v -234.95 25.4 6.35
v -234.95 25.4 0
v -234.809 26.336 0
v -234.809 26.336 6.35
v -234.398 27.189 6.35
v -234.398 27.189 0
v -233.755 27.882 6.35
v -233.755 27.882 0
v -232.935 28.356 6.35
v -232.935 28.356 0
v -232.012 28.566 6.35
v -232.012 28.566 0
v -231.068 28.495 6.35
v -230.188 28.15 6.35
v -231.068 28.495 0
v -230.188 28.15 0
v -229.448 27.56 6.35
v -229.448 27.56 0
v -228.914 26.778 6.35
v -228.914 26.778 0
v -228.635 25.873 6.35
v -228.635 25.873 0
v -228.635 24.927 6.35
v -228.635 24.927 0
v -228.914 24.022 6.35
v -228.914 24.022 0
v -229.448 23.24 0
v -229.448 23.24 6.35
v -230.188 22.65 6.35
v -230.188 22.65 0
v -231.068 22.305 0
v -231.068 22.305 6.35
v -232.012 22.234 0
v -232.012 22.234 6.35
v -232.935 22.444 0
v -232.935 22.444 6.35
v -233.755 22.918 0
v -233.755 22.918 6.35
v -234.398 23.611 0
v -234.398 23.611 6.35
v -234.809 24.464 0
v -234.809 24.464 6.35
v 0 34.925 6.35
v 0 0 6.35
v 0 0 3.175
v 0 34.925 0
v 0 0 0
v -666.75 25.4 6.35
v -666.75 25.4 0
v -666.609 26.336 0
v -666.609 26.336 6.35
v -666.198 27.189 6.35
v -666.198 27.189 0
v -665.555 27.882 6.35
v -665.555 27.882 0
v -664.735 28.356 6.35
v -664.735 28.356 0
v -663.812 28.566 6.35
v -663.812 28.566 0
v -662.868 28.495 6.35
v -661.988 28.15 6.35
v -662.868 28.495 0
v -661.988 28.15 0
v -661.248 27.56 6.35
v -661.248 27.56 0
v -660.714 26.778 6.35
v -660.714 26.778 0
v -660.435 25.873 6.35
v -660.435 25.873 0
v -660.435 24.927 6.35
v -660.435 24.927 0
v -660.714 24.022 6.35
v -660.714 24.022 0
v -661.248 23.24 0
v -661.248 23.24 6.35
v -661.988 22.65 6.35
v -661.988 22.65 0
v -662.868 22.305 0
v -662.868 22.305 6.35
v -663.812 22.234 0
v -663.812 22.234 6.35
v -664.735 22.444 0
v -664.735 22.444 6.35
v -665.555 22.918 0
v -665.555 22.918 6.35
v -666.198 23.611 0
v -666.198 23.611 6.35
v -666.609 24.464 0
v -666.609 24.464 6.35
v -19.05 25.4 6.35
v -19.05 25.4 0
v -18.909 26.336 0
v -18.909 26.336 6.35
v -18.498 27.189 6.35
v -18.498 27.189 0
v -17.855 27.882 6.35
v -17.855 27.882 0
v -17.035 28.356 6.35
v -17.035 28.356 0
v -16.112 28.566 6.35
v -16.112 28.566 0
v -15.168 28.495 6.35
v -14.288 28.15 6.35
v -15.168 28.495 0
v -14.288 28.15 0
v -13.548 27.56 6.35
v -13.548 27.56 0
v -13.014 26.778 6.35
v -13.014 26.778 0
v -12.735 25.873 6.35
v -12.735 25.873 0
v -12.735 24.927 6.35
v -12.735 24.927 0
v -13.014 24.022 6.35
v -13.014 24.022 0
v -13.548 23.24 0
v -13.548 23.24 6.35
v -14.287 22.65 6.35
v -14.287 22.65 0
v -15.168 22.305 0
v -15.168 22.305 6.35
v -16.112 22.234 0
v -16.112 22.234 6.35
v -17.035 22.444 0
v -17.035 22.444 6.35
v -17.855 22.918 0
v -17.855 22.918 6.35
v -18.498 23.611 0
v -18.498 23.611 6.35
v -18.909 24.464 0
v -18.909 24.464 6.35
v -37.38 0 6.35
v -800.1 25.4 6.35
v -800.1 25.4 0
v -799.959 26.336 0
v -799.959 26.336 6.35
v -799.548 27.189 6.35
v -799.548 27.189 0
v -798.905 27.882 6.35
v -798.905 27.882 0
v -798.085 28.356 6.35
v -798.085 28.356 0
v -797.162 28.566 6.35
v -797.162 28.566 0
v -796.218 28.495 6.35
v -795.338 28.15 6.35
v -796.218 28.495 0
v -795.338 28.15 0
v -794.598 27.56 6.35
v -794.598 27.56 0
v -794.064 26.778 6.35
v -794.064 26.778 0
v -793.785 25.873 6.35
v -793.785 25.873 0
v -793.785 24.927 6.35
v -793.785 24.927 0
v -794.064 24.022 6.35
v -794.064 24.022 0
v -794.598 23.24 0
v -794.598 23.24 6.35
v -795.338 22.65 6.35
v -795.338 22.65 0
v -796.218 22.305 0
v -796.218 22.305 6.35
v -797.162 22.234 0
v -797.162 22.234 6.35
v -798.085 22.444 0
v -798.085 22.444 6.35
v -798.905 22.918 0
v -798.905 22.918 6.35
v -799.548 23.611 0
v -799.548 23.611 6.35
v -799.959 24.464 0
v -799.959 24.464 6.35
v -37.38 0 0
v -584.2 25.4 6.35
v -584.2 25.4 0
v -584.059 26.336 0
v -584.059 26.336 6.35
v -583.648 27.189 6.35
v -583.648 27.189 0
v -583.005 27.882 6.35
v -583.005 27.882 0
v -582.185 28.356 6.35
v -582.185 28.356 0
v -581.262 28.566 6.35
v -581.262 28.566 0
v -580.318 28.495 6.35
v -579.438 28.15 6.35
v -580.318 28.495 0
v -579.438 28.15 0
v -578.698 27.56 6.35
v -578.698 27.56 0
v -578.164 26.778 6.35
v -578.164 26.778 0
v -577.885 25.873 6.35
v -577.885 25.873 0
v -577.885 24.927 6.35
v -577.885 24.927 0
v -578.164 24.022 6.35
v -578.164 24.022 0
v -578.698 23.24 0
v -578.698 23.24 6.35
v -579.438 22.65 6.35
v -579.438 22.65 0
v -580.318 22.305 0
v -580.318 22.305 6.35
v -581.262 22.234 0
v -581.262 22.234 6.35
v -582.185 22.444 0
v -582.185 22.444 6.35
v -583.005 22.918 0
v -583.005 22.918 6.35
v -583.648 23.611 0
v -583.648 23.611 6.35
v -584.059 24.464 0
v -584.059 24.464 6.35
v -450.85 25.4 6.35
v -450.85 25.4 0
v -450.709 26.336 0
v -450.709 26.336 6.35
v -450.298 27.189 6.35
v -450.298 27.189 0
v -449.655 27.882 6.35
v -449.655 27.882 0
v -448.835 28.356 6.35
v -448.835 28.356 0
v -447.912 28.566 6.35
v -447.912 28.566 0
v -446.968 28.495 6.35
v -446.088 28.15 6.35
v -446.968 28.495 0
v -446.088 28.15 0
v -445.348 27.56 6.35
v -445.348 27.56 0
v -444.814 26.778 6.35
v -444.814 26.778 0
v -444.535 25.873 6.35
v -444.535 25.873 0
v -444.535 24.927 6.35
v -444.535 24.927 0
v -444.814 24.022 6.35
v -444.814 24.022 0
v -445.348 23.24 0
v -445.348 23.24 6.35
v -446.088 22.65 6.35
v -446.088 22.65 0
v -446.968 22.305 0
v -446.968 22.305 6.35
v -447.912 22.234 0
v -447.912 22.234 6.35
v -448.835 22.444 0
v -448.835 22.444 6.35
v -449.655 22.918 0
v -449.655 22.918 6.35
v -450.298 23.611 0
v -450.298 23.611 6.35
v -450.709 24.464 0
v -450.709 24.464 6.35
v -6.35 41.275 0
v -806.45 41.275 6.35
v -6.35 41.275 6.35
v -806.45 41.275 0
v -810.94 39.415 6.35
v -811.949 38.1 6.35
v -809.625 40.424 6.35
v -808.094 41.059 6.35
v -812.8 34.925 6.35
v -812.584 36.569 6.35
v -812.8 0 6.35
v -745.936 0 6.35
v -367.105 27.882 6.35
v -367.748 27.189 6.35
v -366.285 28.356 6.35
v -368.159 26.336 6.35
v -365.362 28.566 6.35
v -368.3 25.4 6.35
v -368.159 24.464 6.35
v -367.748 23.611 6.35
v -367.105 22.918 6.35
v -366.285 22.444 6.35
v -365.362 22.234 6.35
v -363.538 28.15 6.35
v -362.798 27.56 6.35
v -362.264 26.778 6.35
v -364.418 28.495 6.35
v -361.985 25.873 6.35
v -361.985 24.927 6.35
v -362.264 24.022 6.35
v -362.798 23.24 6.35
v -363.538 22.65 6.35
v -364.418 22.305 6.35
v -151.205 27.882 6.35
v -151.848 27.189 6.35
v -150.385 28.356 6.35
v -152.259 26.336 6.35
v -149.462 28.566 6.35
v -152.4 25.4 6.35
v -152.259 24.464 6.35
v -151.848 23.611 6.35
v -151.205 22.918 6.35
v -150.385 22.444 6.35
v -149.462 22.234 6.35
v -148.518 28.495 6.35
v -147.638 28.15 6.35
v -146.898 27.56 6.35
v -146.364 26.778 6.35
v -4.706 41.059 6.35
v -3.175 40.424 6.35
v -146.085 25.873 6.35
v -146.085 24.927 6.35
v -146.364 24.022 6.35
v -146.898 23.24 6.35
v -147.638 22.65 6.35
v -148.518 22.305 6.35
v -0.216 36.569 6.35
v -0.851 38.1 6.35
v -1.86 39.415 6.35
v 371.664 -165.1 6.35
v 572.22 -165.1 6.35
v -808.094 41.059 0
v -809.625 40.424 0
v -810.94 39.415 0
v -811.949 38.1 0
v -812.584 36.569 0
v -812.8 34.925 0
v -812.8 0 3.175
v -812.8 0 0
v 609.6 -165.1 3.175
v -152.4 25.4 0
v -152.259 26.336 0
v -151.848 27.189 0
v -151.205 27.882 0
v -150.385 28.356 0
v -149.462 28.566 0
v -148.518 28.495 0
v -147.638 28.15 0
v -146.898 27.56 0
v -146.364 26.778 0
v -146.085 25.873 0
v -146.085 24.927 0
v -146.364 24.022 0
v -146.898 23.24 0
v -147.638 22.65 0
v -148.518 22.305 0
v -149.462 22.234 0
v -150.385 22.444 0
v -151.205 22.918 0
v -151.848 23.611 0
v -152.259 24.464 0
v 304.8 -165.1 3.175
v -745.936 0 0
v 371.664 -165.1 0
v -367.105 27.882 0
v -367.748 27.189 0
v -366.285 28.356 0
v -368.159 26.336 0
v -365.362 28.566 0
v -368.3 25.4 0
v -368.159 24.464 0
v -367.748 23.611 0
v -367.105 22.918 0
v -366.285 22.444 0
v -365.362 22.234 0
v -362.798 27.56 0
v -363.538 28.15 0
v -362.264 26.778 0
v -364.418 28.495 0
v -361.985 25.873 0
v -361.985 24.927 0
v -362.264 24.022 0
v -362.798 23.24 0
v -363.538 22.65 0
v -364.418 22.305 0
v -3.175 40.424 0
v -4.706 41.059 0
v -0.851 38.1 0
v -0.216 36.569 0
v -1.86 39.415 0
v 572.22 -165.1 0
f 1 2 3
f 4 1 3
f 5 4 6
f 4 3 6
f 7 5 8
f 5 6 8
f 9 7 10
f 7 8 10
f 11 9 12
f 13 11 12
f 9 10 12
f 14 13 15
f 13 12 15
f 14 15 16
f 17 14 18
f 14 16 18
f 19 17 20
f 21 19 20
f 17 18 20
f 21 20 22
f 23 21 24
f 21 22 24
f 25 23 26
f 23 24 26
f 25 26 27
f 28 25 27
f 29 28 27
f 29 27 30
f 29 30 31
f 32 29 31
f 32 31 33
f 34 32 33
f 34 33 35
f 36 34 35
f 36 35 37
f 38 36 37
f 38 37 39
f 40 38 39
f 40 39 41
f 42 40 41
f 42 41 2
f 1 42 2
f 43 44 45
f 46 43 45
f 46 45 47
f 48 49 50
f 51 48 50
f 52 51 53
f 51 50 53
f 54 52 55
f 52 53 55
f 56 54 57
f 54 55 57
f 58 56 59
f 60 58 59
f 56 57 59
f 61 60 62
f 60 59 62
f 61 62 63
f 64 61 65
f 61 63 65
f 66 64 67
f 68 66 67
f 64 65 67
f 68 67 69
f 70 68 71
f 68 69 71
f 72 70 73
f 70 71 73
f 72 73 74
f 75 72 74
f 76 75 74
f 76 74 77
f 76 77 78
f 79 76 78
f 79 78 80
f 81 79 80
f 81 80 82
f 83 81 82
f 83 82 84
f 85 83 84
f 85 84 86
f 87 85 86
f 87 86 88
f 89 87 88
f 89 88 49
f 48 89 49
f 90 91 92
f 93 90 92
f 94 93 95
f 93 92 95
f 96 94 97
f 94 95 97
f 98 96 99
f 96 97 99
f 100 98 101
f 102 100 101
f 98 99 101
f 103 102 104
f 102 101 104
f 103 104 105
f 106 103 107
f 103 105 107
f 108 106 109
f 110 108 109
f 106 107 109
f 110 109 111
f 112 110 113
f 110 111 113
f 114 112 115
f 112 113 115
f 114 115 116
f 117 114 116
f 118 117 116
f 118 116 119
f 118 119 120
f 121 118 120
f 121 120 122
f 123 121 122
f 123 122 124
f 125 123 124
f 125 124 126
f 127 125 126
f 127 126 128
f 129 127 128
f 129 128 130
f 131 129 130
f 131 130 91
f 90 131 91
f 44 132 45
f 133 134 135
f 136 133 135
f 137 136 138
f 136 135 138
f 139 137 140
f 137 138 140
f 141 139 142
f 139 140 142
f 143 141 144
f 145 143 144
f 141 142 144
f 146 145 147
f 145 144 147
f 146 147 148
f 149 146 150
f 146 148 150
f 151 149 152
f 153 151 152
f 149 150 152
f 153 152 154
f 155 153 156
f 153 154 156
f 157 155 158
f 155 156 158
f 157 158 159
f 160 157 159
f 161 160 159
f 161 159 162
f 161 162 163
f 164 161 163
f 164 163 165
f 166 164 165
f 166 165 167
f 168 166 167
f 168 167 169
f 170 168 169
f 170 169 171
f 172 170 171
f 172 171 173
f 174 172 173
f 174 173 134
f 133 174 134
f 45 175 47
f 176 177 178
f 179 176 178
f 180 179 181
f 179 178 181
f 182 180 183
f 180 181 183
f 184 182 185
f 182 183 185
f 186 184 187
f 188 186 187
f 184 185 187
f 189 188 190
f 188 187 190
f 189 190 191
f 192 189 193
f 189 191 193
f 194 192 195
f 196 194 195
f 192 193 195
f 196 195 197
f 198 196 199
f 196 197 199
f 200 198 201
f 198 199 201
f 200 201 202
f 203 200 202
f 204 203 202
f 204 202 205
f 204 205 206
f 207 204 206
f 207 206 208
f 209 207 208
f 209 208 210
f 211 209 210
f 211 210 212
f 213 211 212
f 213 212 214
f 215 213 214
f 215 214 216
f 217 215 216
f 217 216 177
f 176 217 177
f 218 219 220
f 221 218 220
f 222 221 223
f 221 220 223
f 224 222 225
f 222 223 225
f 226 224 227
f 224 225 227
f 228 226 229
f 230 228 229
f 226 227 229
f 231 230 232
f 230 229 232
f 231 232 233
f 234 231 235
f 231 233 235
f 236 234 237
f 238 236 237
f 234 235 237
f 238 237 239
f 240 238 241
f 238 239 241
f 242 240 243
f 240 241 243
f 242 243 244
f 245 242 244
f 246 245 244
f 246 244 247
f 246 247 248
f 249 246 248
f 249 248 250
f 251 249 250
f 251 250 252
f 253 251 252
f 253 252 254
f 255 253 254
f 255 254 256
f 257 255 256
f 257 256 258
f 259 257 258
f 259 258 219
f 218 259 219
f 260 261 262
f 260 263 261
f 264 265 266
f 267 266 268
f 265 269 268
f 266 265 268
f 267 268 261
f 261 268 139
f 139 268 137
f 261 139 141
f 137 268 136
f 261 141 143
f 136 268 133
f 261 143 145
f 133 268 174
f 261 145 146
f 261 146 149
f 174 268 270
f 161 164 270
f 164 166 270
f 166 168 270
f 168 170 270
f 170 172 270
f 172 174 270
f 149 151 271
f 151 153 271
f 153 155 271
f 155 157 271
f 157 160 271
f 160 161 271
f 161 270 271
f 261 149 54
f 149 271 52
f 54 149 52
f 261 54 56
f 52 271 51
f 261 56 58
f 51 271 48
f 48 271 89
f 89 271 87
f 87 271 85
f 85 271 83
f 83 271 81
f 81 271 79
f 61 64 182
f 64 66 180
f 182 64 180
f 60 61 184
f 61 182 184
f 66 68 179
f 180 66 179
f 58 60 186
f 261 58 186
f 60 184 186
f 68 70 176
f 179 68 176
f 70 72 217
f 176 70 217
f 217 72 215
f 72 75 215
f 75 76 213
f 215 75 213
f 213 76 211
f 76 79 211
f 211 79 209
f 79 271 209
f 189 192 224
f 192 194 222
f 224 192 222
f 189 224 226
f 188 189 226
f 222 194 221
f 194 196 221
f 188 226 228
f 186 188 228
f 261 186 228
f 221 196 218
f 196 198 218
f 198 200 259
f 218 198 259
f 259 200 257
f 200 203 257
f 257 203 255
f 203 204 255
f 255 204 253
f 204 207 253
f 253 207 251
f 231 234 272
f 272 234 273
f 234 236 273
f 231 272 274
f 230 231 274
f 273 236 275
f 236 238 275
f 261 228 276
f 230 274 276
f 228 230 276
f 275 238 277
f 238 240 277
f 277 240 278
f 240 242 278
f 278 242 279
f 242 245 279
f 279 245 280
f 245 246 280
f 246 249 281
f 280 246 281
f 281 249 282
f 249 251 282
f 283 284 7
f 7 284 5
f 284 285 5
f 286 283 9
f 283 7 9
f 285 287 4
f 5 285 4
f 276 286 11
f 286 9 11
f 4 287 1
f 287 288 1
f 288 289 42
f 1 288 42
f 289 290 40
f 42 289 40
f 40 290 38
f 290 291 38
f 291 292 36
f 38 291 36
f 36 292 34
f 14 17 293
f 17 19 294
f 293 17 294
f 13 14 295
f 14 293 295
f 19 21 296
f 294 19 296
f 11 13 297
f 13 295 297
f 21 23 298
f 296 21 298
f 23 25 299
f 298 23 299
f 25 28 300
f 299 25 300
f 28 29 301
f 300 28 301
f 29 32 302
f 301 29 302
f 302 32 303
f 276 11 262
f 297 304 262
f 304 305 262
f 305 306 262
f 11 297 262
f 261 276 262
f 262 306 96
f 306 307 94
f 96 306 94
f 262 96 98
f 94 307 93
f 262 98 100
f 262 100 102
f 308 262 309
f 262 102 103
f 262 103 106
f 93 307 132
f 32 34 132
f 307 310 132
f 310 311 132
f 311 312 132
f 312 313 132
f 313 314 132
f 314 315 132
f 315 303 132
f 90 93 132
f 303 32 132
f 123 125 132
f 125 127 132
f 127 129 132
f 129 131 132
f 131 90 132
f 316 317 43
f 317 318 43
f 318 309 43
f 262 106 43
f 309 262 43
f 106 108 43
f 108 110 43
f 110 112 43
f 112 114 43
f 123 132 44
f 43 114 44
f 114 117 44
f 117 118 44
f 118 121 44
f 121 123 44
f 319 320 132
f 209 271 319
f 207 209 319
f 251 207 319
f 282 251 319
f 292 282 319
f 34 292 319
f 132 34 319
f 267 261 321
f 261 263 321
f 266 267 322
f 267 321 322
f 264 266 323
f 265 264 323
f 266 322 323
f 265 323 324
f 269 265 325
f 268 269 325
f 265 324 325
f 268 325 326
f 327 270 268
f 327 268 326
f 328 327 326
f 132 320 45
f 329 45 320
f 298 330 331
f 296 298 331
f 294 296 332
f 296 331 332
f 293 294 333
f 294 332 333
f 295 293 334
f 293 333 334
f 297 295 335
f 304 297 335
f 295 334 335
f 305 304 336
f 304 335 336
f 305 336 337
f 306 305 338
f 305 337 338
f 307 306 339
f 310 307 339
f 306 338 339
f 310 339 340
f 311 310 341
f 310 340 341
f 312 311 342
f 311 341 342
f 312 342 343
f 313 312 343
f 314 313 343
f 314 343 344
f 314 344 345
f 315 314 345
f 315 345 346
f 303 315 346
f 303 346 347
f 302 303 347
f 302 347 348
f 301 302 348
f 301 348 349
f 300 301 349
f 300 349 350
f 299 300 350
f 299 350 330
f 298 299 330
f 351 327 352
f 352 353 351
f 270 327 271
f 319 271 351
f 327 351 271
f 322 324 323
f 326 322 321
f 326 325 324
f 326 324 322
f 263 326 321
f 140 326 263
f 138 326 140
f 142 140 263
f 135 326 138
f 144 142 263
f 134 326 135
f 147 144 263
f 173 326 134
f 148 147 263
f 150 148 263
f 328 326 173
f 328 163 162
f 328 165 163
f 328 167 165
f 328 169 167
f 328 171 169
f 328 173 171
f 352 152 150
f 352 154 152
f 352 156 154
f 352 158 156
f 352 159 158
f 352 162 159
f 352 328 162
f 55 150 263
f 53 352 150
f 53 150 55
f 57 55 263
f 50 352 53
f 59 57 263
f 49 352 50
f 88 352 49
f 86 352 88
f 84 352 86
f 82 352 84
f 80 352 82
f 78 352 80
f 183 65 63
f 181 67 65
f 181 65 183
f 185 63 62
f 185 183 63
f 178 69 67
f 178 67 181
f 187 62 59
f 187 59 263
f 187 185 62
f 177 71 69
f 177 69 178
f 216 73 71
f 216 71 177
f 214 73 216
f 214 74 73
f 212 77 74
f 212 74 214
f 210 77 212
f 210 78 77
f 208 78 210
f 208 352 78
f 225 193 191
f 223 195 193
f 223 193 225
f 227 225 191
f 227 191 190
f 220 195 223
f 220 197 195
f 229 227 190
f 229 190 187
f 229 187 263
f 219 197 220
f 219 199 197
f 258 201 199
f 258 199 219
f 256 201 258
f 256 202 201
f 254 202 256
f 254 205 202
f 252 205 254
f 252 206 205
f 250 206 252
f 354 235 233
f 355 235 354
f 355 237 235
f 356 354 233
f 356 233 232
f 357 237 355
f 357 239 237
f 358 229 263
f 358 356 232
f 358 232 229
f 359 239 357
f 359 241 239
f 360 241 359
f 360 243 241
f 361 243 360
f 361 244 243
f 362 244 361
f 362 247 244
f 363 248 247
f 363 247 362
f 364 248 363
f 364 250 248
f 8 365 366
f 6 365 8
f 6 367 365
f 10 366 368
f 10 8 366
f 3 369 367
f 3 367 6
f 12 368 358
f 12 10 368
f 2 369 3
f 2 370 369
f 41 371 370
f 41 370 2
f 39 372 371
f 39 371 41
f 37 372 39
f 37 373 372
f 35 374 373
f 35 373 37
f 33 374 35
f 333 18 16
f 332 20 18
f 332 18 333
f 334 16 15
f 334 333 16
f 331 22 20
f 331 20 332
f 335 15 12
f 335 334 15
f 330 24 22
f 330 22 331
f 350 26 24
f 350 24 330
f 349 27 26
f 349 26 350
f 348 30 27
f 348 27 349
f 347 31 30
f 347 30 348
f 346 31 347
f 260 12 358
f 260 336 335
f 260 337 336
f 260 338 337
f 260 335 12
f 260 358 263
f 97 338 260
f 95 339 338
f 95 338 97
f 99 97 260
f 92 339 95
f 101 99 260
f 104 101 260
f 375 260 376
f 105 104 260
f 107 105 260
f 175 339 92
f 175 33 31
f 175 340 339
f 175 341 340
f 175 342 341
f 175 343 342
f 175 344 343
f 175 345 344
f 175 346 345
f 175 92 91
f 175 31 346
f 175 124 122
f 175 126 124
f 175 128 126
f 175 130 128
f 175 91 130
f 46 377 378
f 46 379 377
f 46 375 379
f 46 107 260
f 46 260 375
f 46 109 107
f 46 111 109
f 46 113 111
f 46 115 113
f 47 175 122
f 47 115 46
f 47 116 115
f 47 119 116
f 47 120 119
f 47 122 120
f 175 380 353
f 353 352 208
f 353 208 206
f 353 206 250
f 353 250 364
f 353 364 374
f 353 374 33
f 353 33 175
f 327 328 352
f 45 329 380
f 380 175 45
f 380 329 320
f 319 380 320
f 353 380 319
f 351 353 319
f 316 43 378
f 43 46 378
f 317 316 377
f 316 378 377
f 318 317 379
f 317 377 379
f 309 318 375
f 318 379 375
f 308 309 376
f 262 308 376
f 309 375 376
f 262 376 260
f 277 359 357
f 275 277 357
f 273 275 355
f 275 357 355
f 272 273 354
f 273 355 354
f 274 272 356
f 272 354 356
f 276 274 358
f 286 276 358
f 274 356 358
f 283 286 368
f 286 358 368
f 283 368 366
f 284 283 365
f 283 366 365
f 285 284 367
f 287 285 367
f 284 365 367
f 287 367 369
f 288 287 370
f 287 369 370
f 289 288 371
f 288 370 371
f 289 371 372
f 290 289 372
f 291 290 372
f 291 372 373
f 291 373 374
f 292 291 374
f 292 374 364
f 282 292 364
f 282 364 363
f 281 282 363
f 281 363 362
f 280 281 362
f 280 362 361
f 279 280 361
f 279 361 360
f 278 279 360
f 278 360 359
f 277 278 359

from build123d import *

# Parameters (mm, degrees)
BOSS_EXTRUDE1_DEPTH = 6.35
CUT_EXTRUDE5_DEPTH  = 1432.25665609
CUT_EXTRUDE6_DEPTH  = 721.614
SKETCH19_W          = 812.8
SKETCH19_H          = 6.35
BOSS_EXTRUDE8_DEPTH = 3.175
SKETCH20_W          = 812.8
SKETCH20_H          = 6.35
BOSS_EXTRUDE9_DEPTH = 38.1
FILLET1_R           = 6.35
FILLET2_R           = 6.35
CUT_EXTRUDE7_REACH  = 8.35
SKETCH22_R          = 3.175


with BuildPart() as part:
    # Sketch1 → Boss-Extrude1 (new body)
    with BuildSketch(Plane.XY):
        Polygon((-812.8, 0), (0, 0), (609.6, -165.1), (304.8, -165.1), align=None)
    extrude(amount=BOSS_EXTRUDE1_DEPTH)

    # Sketch17 → Cut-Extrude5 (cut, through all)
    with BuildSketch(Plane(origin=(-795.440818906, 117.508302793, 0), x_dir=(0, 0, -1), z_dir=(-0.989263736, 0.146141234, 0))):
        Polygon((-3.175, 118.7835948), (-6.35, 109.011949569), (-6.35, 209.992544036), (0, 209.992544036), (0, 109.011949569), align=None)
    extrude(amount=-CUT_EXTRUDE5_DEPTH, mode=Mode.SUBTRACT)

    # Sketch18 → Cut-Extrude6 (cut)
    with BuildSketch(Plane(origin=(609.6, -165.1, 0), x_dir=(0, 0, -1), z_dir=(0.965226372, -0.261415476, 0))):
        Polygon((-3.175, 0), (-6.35, -9.771645231), (-6.35, 0.882856688), (0, 0.882856688), (0, -9.771645231), align=None)
    extrude(amount=-CUT_EXTRUDE6_DEPTH, mode=Mode.SUBTRACT)

    # Sketch19 → Boss-Extrude8 (add)
    with BuildSketch(Plane(origin=(0, 0, 0), x_dir=(1, 0, 0), z_dir=(0, 1, 0))):
        with Locations((-406.4, -3.175)):
            Rectangle(SKETCH19_W, SKETCH19_H)
    extrude(amount=BOSS_EXTRUDE8_DEPTH)

    # Sketch20 → Boss-Extrude9 (add)
    with BuildSketch(Plane(origin=(0, 3.175, 0), x_dir=(1, 0, 0), z_dir=(0, 1, 0))):
        with Locations((-406.4, -3.175)):
            Rectangle(SKETCH20_W, SKETCH20_H)
    extrude(amount=BOSS_EXTRUDE9_DEPTH)

    # Fillet1
    fillet1_edges = [part.edges().sort_by_distance(p)[0] for p in [
        (0, 41.275, 3.175),
    ]]
    fillet(fillet1_edges, radius=FILLET1_R)

    # Fillet2
    fillet2_edges = [part.edges().sort_by_distance(p)[0] for p in [
        (-812.8, 41.275, 3.175),
    ]]
    fillet(fillet2_edges, radius=FILLET2_R)

    # Sketch22 → Cut-Extrude7 (cut, up to next)
    with BuildSketch(Plane(origin=(0, 0, 0), x_dir=(-1, 0, 0), z_dir=(0, 0, -1)), mode=Mode.PRIVATE) as cut_extrude7_sk1:
        with Locations((149.225, 25.4)):
            Circle(SKETCH22_R)
    cut_extrude7_tool1 = extrude(cut_extrude7_sk1.sketch, amount=-CUT_EXTRUDE7_REACH, mode=Mode.PRIVATE) & part.part
    add(cut_extrude7_tool1.solids().sort_by_distance((-149.225, 25.4, 0))[0], mode=Mode.SUBTRACT)
    # Sketch22 → Cut-Extrude7 (cut, up to next)
    with BuildSketch(Plane(origin=(0, 0, 0), x_dir=(-1, 0, 0), z_dir=(0, 0, -1)), mode=Mode.PRIVATE) as cut_extrude7_sk2:
        with Locations((796.925, 25.4)):
            Circle(SKETCH22_R)
    cut_extrude7_tool2 = extrude(cut_extrude7_sk2.sketch, amount=-CUT_EXTRUDE7_REACH, mode=Mode.PRIVATE) & part.part
    add(cut_extrude7_tool2.solids().sort_by_distance((-796.925, 25.4, 0))[0], mode=Mode.SUBTRACT)
    # Sketch22 → Cut-Extrude7 (cut, up to next)
    with BuildSketch(Plane(origin=(0, 0, 0), x_dir=(-1, 0, 0), z_dir=(0, 0, -1)), mode=Mode.PRIVATE) as cut_extrude7_sk3:
        with Locations((663.575, 25.4)):
            Circle(SKETCH22_R)
    cut_extrude7_tool3 = extrude(cut_extrude7_sk3.sketch, amount=-CUT_EXTRUDE7_REACH, mode=Mode.PRIVATE) & part.part
    add(cut_extrude7_tool3.solids().sort_by_distance((-663.575, 25.4, 0))[0], mode=Mode.SUBTRACT)
    # Sketch22 → Cut-Extrude7 (cut, up to next)
    with BuildSketch(Plane(origin=(0, 0, 0), x_dir=(-1, 0, 0), z_dir=(0, 0, -1)), mode=Mode.PRIVATE) as cut_extrude7_sk4:
        with Locations((581.025, 25.4)):
            Circle(SKETCH22_R)
    cut_extrude7_tool4 = extrude(cut_extrude7_sk4.sketch, amount=-CUT_EXTRUDE7_REACH, mode=Mode.PRIVATE) & part.part
    add(cut_extrude7_tool4.solids().sort_by_distance((-581.025, 25.4, 0))[0], mode=Mode.SUBTRACT)
    # Sketch22 → Cut-Extrude7 (cut, up to next)
    with BuildSketch(Plane(origin=(0, 0, 0), x_dir=(-1, 0, 0), z_dir=(0, 0, -1)), mode=Mode.PRIVATE) as cut_extrude7_sk5:
        with Locations((447.675, 25.4)):
            Circle(SKETCH22_R)
    cut_extrude7_tool5 = extrude(cut_extrude7_sk5.sketch, amount=-CUT_EXTRUDE7_REACH, mode=Mode.PRIVATE) & part.part
    add(cut_extrude7_tool5.solids().sort_by_distance((-447.675, 25.4, 0))[0], mode=Mode.SUBTRACT)
    # Sketch22 → Cut-Extrude7 (cut, up to next)
    with BuildSketch(Plane(origin=(0, 0, 0), x_dir=(-1, 0, 0), z_dir=(0, 0, -1)), mode=Mode.PRIVATE) as cut_extrude7_sk6:
        with Locations((365.125, 25.4)):
            Circle(SKETCH22_R)
    cut_extrude7_tool6 = extrude(cut_extrude7_sk6.sketch, amount=-CUT_EXTRUDE7_REACH, mode=Mode.PRIVATE) & part.part
    add(cut_extrude7_tool6.solids().sort_by_distance((-365.125, 25.4, 0))[0], mode=Mode.SUBTRACT)
    # Sketch22 → Cut-Extrude7 (cut, up to next)
    with BuildSketch(Plane(origin=(0, 0, 0), x_dir=(-1, 0, 0), z_dir=(0, 0, -1)), mode=Mode.PRIVATE) as cut_extrude7_sk7:
        with Locations((231.775, 25.4)):
            Circle(SKETCH22_R)
    cut_extrude7_tool7 = extrude(cut_extrude7_sk7.sketch, amount=-CUT_EXTRUDE7_REACH, mode=Mode.PRIVATE) & part.part
    add(cut_extrude7_tool7.solids().sort_by_distance((-231.775, 25.4, 0))[0], mode=Mode.SUBTRACT)
    # Sketch22 → Cut-Extrude7 (cut, up to next)
    with BuildSketch(Plane(origin=(0, 0, 0), x_dir=(-1, 0, 0), z_dir=(0, 0, -1)), mode=Mode.PRIVATE) as cut_extrude7_sk8:
        with Locations((15.875, 25.4)):
            Circle(SKETCH22_R)
    cut_extrude7_tool8 = extrude(cut_extrude7_sk8.sketch, amount=-CUT_EXTRUDE7_REACH, mode=Mode.PRIVATE) & part.part
    add(cut_extrude7_tool8.solids().sort_by_distance((-15.875, 25.4, 0))[0], mode=Mode.SUBTRACT)


solid = part.part
